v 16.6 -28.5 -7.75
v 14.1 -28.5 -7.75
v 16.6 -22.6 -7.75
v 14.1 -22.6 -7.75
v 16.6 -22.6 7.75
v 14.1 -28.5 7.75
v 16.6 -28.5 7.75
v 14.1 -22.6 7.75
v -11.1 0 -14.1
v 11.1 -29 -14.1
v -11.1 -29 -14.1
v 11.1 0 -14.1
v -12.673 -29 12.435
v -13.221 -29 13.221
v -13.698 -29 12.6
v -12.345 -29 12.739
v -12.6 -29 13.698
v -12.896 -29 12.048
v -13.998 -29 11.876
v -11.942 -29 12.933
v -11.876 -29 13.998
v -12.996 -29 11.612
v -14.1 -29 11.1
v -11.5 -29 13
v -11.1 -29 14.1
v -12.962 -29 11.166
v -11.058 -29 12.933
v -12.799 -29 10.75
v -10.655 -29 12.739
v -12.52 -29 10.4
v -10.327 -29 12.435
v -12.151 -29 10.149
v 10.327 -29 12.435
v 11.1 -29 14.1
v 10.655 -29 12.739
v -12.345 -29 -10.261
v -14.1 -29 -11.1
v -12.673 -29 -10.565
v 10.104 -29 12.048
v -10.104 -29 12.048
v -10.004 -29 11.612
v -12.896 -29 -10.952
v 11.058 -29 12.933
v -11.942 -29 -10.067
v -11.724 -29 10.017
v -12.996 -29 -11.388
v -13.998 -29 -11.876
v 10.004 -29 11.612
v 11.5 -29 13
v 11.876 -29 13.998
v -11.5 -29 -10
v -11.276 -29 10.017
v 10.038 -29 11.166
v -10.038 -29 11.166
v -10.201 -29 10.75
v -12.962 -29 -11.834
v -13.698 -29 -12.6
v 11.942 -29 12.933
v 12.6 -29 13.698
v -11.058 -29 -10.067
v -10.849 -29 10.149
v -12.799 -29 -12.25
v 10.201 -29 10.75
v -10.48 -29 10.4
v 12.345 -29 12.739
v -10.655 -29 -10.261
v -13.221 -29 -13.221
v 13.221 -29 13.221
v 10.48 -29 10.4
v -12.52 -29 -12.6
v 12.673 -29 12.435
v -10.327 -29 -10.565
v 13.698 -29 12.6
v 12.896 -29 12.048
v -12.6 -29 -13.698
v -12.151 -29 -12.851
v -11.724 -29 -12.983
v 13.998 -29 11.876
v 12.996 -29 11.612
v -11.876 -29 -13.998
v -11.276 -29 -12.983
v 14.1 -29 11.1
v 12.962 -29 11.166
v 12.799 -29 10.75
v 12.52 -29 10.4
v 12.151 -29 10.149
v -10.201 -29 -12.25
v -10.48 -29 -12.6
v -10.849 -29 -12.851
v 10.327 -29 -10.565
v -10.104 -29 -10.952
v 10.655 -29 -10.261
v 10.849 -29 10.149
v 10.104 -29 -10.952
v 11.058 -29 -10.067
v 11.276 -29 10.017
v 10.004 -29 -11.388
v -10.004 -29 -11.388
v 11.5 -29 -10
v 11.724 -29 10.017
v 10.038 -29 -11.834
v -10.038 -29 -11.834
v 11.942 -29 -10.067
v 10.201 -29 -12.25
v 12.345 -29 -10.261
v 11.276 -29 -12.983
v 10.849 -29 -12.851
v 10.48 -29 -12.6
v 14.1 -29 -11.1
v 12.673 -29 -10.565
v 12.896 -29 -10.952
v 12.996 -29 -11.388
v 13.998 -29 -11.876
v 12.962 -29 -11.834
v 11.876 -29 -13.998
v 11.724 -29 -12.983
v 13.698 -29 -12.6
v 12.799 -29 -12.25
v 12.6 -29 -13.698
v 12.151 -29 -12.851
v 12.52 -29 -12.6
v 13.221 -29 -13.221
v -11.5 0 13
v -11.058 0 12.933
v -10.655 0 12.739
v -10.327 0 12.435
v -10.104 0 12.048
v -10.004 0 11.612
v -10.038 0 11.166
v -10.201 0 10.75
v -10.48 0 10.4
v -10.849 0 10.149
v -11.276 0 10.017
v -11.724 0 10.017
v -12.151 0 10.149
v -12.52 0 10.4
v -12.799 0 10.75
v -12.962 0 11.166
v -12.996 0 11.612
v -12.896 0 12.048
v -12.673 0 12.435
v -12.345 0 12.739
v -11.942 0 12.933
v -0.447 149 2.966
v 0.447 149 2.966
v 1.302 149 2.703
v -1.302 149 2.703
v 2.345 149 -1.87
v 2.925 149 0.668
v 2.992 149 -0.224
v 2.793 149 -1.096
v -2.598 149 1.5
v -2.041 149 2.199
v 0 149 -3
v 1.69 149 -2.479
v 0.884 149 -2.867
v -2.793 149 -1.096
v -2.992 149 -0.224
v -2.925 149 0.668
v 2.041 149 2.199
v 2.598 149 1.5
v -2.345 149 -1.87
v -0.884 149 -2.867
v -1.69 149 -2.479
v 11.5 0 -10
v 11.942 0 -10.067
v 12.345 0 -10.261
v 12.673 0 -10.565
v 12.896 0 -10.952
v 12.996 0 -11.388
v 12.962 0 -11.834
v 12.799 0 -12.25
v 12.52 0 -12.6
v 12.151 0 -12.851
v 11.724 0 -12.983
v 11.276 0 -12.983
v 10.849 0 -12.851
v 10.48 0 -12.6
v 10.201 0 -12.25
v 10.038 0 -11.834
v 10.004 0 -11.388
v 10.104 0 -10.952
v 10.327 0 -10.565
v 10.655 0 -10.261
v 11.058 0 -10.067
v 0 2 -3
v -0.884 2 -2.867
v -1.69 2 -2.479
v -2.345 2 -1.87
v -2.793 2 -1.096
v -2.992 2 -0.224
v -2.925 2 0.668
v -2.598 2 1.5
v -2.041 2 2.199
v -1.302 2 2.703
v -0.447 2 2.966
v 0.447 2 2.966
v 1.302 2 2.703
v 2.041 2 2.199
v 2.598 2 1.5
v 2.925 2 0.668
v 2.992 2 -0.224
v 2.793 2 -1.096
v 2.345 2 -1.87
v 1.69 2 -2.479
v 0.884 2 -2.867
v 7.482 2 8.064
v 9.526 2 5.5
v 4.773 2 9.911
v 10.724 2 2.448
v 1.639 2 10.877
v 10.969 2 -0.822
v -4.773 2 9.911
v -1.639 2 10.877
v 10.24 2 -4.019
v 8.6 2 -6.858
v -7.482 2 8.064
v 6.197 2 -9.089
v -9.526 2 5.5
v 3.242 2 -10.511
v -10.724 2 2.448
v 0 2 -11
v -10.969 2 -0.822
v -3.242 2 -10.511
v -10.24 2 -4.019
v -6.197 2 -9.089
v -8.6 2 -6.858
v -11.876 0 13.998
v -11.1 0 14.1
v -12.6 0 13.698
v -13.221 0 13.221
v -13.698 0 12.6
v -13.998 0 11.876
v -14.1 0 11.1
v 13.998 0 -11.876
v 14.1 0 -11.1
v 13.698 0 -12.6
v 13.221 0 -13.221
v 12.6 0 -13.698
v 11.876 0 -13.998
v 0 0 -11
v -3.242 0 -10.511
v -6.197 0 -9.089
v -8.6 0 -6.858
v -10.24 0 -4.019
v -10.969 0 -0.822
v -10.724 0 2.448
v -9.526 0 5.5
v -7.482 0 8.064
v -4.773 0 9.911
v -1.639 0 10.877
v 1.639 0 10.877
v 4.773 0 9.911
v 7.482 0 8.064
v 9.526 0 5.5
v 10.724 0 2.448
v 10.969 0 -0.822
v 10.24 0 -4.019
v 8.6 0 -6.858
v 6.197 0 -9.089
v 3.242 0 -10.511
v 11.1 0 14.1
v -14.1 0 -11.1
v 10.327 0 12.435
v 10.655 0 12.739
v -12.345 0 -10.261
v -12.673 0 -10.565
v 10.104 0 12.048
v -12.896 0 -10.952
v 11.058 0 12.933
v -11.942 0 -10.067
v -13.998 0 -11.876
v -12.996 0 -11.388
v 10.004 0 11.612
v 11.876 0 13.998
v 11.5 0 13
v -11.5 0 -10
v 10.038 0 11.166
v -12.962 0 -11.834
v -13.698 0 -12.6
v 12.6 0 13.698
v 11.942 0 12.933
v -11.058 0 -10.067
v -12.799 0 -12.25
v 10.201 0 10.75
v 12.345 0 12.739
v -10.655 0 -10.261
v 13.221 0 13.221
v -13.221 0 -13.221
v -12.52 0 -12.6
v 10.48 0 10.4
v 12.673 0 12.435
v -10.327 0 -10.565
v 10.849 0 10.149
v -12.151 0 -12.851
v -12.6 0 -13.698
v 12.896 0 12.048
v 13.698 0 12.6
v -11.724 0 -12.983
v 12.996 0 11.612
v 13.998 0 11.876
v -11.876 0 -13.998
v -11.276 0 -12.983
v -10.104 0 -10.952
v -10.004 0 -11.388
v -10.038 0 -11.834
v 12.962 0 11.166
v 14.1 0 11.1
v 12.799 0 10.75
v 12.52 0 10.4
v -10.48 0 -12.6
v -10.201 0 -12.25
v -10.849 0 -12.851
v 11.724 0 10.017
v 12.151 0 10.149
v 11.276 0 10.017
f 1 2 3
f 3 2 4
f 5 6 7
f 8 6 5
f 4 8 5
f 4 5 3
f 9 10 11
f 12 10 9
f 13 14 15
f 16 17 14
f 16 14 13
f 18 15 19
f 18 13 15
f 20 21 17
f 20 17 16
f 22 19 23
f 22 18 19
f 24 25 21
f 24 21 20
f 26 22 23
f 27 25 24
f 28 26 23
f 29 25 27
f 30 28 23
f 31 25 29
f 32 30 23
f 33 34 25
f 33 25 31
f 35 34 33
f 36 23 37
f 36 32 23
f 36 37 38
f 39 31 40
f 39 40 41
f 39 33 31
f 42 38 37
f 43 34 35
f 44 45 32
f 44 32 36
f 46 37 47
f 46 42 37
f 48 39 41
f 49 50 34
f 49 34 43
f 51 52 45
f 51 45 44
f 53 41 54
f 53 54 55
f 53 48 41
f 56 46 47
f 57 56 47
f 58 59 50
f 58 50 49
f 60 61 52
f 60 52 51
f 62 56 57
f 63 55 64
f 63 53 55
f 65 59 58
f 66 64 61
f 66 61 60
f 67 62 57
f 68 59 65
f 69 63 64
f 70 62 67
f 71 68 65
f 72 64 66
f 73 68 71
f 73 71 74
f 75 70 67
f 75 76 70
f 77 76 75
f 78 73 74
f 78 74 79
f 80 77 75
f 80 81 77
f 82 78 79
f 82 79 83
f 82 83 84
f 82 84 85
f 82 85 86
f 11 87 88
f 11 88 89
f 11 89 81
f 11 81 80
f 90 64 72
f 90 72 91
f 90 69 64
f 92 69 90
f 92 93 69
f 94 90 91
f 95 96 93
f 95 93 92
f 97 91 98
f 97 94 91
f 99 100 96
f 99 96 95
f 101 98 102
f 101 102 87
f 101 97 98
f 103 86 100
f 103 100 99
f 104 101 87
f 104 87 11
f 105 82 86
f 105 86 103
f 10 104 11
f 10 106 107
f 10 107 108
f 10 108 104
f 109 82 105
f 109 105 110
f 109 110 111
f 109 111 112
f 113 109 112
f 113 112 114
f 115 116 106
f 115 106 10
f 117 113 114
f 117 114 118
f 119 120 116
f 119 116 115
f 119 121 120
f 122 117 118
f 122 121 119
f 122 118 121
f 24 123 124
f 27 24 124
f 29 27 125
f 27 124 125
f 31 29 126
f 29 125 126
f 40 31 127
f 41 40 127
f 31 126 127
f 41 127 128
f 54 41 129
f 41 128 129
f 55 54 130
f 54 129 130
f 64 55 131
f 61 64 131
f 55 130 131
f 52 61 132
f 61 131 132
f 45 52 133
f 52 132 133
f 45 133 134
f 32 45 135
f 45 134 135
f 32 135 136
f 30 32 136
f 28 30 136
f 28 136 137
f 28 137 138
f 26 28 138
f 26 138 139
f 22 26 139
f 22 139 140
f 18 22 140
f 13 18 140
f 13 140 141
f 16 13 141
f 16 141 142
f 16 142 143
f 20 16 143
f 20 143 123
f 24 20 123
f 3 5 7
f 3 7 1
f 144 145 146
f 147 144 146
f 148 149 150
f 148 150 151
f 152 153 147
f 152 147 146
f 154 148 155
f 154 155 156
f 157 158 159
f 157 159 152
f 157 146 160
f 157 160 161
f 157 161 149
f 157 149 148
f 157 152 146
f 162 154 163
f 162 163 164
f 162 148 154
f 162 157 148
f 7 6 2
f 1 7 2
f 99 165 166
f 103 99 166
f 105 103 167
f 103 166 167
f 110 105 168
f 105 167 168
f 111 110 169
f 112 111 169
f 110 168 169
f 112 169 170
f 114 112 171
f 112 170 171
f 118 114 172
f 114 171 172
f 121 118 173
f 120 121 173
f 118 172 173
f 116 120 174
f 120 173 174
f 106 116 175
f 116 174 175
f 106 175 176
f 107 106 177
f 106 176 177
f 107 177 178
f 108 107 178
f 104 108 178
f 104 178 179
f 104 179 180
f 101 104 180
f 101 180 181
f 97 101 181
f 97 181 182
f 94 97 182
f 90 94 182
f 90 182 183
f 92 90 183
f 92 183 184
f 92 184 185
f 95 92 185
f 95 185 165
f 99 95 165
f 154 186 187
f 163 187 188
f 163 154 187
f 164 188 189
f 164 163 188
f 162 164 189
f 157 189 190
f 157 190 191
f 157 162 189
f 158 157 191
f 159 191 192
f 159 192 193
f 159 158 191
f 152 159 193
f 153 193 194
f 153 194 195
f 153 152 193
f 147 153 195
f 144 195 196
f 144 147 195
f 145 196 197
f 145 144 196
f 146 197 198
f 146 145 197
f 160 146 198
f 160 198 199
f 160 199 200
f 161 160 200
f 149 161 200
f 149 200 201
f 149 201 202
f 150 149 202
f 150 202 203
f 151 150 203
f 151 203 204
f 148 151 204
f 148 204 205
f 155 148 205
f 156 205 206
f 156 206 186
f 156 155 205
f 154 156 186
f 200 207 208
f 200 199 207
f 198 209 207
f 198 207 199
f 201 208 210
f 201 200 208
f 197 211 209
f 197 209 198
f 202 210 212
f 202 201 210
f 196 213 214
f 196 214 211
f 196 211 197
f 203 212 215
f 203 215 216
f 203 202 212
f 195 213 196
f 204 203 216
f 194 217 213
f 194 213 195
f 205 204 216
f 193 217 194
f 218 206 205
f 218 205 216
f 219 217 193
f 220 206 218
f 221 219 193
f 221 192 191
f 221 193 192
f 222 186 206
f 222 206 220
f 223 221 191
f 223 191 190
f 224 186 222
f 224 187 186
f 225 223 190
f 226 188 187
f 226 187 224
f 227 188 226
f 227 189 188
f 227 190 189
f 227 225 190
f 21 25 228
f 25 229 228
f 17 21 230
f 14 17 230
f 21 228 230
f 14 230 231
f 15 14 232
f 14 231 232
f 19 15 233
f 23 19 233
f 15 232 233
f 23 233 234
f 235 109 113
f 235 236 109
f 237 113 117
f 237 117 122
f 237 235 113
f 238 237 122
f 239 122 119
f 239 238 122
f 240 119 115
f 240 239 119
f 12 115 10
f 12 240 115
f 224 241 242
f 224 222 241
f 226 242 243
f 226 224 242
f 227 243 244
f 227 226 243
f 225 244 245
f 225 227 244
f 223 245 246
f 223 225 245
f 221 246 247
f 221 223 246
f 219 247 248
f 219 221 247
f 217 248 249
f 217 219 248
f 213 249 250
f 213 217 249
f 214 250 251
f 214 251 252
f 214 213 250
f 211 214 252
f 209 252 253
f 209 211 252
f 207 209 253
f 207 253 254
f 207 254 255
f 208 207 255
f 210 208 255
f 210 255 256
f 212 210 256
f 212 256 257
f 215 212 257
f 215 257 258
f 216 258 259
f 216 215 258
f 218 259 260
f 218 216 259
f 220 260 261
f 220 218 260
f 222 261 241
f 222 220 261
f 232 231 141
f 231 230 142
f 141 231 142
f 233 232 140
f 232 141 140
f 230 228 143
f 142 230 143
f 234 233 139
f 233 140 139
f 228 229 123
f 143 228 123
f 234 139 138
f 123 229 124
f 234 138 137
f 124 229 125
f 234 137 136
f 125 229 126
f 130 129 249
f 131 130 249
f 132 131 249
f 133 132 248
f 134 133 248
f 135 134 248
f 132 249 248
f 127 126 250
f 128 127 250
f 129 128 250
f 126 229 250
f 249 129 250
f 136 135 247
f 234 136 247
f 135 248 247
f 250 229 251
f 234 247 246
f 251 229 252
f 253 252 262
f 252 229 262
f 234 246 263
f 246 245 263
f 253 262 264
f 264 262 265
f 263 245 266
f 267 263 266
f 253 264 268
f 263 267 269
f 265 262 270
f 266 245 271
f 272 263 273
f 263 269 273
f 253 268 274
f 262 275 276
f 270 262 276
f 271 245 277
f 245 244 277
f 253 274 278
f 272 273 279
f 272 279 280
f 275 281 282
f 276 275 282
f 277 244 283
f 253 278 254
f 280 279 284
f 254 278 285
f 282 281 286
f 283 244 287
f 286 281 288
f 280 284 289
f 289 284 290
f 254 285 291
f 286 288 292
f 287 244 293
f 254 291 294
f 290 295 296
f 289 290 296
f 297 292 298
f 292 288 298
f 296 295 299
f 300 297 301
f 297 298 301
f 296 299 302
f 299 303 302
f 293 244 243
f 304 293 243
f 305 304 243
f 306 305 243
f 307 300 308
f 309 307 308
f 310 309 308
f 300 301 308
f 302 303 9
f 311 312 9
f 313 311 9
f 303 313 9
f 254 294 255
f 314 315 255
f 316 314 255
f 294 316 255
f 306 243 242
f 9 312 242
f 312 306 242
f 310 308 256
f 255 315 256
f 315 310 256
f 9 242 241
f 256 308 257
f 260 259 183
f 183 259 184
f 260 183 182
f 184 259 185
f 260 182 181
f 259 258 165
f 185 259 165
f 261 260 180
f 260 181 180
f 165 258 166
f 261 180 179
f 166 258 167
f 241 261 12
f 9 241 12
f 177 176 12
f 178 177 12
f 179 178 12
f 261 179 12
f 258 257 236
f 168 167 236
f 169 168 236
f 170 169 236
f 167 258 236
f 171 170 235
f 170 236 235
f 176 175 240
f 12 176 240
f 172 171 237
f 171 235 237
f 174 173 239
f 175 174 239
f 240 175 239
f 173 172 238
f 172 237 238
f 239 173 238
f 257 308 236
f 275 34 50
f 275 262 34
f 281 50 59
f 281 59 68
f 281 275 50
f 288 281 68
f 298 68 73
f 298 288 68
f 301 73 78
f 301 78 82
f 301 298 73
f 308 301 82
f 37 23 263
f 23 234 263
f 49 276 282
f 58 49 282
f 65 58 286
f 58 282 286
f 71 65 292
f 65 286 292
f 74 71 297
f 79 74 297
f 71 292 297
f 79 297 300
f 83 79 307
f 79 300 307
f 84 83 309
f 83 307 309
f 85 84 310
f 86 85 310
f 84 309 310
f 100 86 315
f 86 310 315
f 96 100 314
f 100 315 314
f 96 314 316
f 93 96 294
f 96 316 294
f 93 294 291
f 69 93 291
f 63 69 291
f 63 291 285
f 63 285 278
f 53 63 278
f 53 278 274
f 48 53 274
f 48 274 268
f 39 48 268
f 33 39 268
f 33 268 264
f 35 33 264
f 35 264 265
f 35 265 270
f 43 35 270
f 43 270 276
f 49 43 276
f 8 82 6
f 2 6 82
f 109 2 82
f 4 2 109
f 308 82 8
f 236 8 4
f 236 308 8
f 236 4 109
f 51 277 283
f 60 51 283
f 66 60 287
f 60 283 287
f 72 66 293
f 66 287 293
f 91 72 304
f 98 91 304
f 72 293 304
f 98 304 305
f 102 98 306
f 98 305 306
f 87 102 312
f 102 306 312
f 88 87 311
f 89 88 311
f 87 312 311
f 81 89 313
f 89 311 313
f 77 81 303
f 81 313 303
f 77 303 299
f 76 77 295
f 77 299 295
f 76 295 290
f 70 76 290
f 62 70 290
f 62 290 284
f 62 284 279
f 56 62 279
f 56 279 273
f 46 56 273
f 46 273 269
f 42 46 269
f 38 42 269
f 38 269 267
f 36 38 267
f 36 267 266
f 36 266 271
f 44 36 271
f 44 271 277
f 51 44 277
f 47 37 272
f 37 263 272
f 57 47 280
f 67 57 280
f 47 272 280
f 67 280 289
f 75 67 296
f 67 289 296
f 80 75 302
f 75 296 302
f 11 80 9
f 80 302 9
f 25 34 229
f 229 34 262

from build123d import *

# Parameters (mm, degrees)
SKETCH2_W           = 11
SKETCH2_H           = 2
SKETCH3_W           = 28.2
SKETCH3_H           = 29
BOSS_EXTRUDE1_DEPTH = 14.1
FILLET1_R           = 3
SKETCH5_W           = 15.5
SKETCH5_H           = 5.9
BOSS_EXTRUDE2_DEPTH = 2.5
SKETCH1_W           = 3
SKETCH1_H           = 147
CUT_EXTRUDE1_REACH  = 152.583
SKETCH7_R           = 1.5


with BuildPart() as part:
    # Sketch2 → Revolve2 (revolve)
    with BuildSketch(Plane(origin=(0, 0, 0), x_dir=(0, 0, -1), z_dir=(1, 0, 0)), mode=Mode.PRIVATE) as revolve2_sk:
        with Locations((-5.5, 1)):
            Rectangle(SKETCH2_W, SKETCH2_H)
    revolve(revolve2_sk.sketch.rotate(Axis((0, -54.281249734, 0), (0, 1, 0)), 180), axis=Axis((0, -54.281249734, 0), (0, 1, 0)))

    # Sketch3 → Boss-Extrude1 (add, symmetric)
    with BuildSketch(Plane(origin=(0, 0, 0), x_dir=(0, 0, -1), z_dir=(1, 0, 0))):
        with Locations((0, -14.5)):
            Rectangle(SKETCH3_W, SKETCH3_H)
    extrude(amount=BOSS_EXTRUDE1_DEPTH, both=True)

    # Fillet1
    fillet1_edges = [part.edges().sort_by_distance(p)[0] for p in [
        (-14.1, -14.5, -14.1),
        (14.1, -14.5, 14.1),
        (14.1, -14.5, -14.1),
        (-14.1, -14.5, 14.1),
    ]]
    fillet(fillet1_edges, radius=FILLET1_R)

    # Sketch5 → Boss-Extrude2 (add)
    with BuildSketch(Plane(origin=(14.1, 0, 0), x_dir=(0, 0, -1), z_dir=(1, 0, 0))):
        with Locations((0, -25.55)):
            Rectangle(SKETCH5_W, SKETCH5_H)
    extrude(amount=BOSS_EXTRUDE2_DEPTH)

    # Sketch1 → Revolve3 (revolve)
    with BuildSketch(Plane(origin=(0, 0, 0), x_dir=(0, 0, -1), z_dir=(1, 0, 0)), mode=Mode.PRIVATE) as revolve3_sk:
        with Locations((-1.5, 75.5)):
            Rectangle(SKETCH1_W, SKETCH1_H)
    revolve(revolve3_sk.sketch.rotate(Axis((0, -54.281249734, 0), (0, 1, 0)), 180), axis=Axis((0, -54.281249734, 0), (0, 1, 0)))

    # Sketch7 → Cut-Extrude1 (cut, up to next)
    with BuildSketch(Plane(origin=(0, 0, 0), x_dir=(1, 0, 0), z_dir=(0, 1, 0)), mode=Mode.PRIVATE) as cut_extrude1_sk1:
        with Locations(Location((-11.5, 11.5, 0), (0, 0, 270))):
            Circle(SKETCH7_R)
    cut_extrude1_tool1 = extrude(cut_extrude1_sk1.sketch, amount=-CUT_EXTRUDE1_REACH, mode=Mode.PRIVATE) & part.part
    # Sketch7 → Cut-Extrude1 (cut, up to next)
    with BuildSketch(Plane(origin=(0, 0, 0), x_dir=(1, 0, 0), z_dir=(0, 1, 0)), mode=Mode.PRIVATE) as cut_extrude1_sk2:
        with Locations(Location((-11.5, -11.5, 0), (0, 0, 270))):
            Circle(SKETCH7_R)
    cut_extrude1_tool2 = extrude(cut_extrude1_sk2.sketch, amount=-CUT_EXTRUDE1_REACH, mode=Mode.PRIVATE) & part.part
    # Sketch7 → Cut-Extrude1 (cut, up to next)
    with BuildSketch(Plane(origin=(0, 0, 0), x_dir=(1, 0, 0), z_dir=(0, 1, 0)), mode=Mode.PRIVATE) as cut_extrude1_sk3:
        with Locations(Location((11.5, -11.5, 0), (0, 0, 270))):
            Circle(SKETCH7_R)
    cut_extrude1_tool3 = extrude(cut_extrude1_sk3.sketch, amount=-CUT_EXTRUDE1_REACH, mode=Mode.PRIVATE) & part.part
    # Sketch7 → Cut-Extrude1 (cut, up to next)
    with BuildSketch(Plane(origin=(0, 0, 0), x_dir=(1, 0, 0), z_dir=(0, 1, 0)), mode=Mode.PRIVATE) as cut_extrude1_sk4:
        with Locations(Location((11.5, 11.5, 0), (0, 0, 270))):
            Circle(SKETCH7_R)
    cut_extrude1_tool4 = extrude(cut_extrude1_sk4.sketch, amount=-CUT_EXTRUDE1_REACH, mode=Mode.PRIVATE) & part.part
    add(cut_extrude1_tool1.solids().sort_by_distance((-11.5, 0, -11.5))[0], mode=Mode.SUBTRACT)
    add(cut_extrude1_tool2.solids().sort_by_distance((-11.5, 0, 11.5))[0], mode=Mode.SUBTRACT)
    add(cut_extrude1_tool3.solids().sort_by_distance((11.5, 0, 11.5))[0], mode=Mode.SUBTRACT)
    add(cut_extrude1_tool4.solids().sort_by_distance((11.5, 0, -11.5))[0], mode=Mode.SUBTRACT)


solid = part.part
